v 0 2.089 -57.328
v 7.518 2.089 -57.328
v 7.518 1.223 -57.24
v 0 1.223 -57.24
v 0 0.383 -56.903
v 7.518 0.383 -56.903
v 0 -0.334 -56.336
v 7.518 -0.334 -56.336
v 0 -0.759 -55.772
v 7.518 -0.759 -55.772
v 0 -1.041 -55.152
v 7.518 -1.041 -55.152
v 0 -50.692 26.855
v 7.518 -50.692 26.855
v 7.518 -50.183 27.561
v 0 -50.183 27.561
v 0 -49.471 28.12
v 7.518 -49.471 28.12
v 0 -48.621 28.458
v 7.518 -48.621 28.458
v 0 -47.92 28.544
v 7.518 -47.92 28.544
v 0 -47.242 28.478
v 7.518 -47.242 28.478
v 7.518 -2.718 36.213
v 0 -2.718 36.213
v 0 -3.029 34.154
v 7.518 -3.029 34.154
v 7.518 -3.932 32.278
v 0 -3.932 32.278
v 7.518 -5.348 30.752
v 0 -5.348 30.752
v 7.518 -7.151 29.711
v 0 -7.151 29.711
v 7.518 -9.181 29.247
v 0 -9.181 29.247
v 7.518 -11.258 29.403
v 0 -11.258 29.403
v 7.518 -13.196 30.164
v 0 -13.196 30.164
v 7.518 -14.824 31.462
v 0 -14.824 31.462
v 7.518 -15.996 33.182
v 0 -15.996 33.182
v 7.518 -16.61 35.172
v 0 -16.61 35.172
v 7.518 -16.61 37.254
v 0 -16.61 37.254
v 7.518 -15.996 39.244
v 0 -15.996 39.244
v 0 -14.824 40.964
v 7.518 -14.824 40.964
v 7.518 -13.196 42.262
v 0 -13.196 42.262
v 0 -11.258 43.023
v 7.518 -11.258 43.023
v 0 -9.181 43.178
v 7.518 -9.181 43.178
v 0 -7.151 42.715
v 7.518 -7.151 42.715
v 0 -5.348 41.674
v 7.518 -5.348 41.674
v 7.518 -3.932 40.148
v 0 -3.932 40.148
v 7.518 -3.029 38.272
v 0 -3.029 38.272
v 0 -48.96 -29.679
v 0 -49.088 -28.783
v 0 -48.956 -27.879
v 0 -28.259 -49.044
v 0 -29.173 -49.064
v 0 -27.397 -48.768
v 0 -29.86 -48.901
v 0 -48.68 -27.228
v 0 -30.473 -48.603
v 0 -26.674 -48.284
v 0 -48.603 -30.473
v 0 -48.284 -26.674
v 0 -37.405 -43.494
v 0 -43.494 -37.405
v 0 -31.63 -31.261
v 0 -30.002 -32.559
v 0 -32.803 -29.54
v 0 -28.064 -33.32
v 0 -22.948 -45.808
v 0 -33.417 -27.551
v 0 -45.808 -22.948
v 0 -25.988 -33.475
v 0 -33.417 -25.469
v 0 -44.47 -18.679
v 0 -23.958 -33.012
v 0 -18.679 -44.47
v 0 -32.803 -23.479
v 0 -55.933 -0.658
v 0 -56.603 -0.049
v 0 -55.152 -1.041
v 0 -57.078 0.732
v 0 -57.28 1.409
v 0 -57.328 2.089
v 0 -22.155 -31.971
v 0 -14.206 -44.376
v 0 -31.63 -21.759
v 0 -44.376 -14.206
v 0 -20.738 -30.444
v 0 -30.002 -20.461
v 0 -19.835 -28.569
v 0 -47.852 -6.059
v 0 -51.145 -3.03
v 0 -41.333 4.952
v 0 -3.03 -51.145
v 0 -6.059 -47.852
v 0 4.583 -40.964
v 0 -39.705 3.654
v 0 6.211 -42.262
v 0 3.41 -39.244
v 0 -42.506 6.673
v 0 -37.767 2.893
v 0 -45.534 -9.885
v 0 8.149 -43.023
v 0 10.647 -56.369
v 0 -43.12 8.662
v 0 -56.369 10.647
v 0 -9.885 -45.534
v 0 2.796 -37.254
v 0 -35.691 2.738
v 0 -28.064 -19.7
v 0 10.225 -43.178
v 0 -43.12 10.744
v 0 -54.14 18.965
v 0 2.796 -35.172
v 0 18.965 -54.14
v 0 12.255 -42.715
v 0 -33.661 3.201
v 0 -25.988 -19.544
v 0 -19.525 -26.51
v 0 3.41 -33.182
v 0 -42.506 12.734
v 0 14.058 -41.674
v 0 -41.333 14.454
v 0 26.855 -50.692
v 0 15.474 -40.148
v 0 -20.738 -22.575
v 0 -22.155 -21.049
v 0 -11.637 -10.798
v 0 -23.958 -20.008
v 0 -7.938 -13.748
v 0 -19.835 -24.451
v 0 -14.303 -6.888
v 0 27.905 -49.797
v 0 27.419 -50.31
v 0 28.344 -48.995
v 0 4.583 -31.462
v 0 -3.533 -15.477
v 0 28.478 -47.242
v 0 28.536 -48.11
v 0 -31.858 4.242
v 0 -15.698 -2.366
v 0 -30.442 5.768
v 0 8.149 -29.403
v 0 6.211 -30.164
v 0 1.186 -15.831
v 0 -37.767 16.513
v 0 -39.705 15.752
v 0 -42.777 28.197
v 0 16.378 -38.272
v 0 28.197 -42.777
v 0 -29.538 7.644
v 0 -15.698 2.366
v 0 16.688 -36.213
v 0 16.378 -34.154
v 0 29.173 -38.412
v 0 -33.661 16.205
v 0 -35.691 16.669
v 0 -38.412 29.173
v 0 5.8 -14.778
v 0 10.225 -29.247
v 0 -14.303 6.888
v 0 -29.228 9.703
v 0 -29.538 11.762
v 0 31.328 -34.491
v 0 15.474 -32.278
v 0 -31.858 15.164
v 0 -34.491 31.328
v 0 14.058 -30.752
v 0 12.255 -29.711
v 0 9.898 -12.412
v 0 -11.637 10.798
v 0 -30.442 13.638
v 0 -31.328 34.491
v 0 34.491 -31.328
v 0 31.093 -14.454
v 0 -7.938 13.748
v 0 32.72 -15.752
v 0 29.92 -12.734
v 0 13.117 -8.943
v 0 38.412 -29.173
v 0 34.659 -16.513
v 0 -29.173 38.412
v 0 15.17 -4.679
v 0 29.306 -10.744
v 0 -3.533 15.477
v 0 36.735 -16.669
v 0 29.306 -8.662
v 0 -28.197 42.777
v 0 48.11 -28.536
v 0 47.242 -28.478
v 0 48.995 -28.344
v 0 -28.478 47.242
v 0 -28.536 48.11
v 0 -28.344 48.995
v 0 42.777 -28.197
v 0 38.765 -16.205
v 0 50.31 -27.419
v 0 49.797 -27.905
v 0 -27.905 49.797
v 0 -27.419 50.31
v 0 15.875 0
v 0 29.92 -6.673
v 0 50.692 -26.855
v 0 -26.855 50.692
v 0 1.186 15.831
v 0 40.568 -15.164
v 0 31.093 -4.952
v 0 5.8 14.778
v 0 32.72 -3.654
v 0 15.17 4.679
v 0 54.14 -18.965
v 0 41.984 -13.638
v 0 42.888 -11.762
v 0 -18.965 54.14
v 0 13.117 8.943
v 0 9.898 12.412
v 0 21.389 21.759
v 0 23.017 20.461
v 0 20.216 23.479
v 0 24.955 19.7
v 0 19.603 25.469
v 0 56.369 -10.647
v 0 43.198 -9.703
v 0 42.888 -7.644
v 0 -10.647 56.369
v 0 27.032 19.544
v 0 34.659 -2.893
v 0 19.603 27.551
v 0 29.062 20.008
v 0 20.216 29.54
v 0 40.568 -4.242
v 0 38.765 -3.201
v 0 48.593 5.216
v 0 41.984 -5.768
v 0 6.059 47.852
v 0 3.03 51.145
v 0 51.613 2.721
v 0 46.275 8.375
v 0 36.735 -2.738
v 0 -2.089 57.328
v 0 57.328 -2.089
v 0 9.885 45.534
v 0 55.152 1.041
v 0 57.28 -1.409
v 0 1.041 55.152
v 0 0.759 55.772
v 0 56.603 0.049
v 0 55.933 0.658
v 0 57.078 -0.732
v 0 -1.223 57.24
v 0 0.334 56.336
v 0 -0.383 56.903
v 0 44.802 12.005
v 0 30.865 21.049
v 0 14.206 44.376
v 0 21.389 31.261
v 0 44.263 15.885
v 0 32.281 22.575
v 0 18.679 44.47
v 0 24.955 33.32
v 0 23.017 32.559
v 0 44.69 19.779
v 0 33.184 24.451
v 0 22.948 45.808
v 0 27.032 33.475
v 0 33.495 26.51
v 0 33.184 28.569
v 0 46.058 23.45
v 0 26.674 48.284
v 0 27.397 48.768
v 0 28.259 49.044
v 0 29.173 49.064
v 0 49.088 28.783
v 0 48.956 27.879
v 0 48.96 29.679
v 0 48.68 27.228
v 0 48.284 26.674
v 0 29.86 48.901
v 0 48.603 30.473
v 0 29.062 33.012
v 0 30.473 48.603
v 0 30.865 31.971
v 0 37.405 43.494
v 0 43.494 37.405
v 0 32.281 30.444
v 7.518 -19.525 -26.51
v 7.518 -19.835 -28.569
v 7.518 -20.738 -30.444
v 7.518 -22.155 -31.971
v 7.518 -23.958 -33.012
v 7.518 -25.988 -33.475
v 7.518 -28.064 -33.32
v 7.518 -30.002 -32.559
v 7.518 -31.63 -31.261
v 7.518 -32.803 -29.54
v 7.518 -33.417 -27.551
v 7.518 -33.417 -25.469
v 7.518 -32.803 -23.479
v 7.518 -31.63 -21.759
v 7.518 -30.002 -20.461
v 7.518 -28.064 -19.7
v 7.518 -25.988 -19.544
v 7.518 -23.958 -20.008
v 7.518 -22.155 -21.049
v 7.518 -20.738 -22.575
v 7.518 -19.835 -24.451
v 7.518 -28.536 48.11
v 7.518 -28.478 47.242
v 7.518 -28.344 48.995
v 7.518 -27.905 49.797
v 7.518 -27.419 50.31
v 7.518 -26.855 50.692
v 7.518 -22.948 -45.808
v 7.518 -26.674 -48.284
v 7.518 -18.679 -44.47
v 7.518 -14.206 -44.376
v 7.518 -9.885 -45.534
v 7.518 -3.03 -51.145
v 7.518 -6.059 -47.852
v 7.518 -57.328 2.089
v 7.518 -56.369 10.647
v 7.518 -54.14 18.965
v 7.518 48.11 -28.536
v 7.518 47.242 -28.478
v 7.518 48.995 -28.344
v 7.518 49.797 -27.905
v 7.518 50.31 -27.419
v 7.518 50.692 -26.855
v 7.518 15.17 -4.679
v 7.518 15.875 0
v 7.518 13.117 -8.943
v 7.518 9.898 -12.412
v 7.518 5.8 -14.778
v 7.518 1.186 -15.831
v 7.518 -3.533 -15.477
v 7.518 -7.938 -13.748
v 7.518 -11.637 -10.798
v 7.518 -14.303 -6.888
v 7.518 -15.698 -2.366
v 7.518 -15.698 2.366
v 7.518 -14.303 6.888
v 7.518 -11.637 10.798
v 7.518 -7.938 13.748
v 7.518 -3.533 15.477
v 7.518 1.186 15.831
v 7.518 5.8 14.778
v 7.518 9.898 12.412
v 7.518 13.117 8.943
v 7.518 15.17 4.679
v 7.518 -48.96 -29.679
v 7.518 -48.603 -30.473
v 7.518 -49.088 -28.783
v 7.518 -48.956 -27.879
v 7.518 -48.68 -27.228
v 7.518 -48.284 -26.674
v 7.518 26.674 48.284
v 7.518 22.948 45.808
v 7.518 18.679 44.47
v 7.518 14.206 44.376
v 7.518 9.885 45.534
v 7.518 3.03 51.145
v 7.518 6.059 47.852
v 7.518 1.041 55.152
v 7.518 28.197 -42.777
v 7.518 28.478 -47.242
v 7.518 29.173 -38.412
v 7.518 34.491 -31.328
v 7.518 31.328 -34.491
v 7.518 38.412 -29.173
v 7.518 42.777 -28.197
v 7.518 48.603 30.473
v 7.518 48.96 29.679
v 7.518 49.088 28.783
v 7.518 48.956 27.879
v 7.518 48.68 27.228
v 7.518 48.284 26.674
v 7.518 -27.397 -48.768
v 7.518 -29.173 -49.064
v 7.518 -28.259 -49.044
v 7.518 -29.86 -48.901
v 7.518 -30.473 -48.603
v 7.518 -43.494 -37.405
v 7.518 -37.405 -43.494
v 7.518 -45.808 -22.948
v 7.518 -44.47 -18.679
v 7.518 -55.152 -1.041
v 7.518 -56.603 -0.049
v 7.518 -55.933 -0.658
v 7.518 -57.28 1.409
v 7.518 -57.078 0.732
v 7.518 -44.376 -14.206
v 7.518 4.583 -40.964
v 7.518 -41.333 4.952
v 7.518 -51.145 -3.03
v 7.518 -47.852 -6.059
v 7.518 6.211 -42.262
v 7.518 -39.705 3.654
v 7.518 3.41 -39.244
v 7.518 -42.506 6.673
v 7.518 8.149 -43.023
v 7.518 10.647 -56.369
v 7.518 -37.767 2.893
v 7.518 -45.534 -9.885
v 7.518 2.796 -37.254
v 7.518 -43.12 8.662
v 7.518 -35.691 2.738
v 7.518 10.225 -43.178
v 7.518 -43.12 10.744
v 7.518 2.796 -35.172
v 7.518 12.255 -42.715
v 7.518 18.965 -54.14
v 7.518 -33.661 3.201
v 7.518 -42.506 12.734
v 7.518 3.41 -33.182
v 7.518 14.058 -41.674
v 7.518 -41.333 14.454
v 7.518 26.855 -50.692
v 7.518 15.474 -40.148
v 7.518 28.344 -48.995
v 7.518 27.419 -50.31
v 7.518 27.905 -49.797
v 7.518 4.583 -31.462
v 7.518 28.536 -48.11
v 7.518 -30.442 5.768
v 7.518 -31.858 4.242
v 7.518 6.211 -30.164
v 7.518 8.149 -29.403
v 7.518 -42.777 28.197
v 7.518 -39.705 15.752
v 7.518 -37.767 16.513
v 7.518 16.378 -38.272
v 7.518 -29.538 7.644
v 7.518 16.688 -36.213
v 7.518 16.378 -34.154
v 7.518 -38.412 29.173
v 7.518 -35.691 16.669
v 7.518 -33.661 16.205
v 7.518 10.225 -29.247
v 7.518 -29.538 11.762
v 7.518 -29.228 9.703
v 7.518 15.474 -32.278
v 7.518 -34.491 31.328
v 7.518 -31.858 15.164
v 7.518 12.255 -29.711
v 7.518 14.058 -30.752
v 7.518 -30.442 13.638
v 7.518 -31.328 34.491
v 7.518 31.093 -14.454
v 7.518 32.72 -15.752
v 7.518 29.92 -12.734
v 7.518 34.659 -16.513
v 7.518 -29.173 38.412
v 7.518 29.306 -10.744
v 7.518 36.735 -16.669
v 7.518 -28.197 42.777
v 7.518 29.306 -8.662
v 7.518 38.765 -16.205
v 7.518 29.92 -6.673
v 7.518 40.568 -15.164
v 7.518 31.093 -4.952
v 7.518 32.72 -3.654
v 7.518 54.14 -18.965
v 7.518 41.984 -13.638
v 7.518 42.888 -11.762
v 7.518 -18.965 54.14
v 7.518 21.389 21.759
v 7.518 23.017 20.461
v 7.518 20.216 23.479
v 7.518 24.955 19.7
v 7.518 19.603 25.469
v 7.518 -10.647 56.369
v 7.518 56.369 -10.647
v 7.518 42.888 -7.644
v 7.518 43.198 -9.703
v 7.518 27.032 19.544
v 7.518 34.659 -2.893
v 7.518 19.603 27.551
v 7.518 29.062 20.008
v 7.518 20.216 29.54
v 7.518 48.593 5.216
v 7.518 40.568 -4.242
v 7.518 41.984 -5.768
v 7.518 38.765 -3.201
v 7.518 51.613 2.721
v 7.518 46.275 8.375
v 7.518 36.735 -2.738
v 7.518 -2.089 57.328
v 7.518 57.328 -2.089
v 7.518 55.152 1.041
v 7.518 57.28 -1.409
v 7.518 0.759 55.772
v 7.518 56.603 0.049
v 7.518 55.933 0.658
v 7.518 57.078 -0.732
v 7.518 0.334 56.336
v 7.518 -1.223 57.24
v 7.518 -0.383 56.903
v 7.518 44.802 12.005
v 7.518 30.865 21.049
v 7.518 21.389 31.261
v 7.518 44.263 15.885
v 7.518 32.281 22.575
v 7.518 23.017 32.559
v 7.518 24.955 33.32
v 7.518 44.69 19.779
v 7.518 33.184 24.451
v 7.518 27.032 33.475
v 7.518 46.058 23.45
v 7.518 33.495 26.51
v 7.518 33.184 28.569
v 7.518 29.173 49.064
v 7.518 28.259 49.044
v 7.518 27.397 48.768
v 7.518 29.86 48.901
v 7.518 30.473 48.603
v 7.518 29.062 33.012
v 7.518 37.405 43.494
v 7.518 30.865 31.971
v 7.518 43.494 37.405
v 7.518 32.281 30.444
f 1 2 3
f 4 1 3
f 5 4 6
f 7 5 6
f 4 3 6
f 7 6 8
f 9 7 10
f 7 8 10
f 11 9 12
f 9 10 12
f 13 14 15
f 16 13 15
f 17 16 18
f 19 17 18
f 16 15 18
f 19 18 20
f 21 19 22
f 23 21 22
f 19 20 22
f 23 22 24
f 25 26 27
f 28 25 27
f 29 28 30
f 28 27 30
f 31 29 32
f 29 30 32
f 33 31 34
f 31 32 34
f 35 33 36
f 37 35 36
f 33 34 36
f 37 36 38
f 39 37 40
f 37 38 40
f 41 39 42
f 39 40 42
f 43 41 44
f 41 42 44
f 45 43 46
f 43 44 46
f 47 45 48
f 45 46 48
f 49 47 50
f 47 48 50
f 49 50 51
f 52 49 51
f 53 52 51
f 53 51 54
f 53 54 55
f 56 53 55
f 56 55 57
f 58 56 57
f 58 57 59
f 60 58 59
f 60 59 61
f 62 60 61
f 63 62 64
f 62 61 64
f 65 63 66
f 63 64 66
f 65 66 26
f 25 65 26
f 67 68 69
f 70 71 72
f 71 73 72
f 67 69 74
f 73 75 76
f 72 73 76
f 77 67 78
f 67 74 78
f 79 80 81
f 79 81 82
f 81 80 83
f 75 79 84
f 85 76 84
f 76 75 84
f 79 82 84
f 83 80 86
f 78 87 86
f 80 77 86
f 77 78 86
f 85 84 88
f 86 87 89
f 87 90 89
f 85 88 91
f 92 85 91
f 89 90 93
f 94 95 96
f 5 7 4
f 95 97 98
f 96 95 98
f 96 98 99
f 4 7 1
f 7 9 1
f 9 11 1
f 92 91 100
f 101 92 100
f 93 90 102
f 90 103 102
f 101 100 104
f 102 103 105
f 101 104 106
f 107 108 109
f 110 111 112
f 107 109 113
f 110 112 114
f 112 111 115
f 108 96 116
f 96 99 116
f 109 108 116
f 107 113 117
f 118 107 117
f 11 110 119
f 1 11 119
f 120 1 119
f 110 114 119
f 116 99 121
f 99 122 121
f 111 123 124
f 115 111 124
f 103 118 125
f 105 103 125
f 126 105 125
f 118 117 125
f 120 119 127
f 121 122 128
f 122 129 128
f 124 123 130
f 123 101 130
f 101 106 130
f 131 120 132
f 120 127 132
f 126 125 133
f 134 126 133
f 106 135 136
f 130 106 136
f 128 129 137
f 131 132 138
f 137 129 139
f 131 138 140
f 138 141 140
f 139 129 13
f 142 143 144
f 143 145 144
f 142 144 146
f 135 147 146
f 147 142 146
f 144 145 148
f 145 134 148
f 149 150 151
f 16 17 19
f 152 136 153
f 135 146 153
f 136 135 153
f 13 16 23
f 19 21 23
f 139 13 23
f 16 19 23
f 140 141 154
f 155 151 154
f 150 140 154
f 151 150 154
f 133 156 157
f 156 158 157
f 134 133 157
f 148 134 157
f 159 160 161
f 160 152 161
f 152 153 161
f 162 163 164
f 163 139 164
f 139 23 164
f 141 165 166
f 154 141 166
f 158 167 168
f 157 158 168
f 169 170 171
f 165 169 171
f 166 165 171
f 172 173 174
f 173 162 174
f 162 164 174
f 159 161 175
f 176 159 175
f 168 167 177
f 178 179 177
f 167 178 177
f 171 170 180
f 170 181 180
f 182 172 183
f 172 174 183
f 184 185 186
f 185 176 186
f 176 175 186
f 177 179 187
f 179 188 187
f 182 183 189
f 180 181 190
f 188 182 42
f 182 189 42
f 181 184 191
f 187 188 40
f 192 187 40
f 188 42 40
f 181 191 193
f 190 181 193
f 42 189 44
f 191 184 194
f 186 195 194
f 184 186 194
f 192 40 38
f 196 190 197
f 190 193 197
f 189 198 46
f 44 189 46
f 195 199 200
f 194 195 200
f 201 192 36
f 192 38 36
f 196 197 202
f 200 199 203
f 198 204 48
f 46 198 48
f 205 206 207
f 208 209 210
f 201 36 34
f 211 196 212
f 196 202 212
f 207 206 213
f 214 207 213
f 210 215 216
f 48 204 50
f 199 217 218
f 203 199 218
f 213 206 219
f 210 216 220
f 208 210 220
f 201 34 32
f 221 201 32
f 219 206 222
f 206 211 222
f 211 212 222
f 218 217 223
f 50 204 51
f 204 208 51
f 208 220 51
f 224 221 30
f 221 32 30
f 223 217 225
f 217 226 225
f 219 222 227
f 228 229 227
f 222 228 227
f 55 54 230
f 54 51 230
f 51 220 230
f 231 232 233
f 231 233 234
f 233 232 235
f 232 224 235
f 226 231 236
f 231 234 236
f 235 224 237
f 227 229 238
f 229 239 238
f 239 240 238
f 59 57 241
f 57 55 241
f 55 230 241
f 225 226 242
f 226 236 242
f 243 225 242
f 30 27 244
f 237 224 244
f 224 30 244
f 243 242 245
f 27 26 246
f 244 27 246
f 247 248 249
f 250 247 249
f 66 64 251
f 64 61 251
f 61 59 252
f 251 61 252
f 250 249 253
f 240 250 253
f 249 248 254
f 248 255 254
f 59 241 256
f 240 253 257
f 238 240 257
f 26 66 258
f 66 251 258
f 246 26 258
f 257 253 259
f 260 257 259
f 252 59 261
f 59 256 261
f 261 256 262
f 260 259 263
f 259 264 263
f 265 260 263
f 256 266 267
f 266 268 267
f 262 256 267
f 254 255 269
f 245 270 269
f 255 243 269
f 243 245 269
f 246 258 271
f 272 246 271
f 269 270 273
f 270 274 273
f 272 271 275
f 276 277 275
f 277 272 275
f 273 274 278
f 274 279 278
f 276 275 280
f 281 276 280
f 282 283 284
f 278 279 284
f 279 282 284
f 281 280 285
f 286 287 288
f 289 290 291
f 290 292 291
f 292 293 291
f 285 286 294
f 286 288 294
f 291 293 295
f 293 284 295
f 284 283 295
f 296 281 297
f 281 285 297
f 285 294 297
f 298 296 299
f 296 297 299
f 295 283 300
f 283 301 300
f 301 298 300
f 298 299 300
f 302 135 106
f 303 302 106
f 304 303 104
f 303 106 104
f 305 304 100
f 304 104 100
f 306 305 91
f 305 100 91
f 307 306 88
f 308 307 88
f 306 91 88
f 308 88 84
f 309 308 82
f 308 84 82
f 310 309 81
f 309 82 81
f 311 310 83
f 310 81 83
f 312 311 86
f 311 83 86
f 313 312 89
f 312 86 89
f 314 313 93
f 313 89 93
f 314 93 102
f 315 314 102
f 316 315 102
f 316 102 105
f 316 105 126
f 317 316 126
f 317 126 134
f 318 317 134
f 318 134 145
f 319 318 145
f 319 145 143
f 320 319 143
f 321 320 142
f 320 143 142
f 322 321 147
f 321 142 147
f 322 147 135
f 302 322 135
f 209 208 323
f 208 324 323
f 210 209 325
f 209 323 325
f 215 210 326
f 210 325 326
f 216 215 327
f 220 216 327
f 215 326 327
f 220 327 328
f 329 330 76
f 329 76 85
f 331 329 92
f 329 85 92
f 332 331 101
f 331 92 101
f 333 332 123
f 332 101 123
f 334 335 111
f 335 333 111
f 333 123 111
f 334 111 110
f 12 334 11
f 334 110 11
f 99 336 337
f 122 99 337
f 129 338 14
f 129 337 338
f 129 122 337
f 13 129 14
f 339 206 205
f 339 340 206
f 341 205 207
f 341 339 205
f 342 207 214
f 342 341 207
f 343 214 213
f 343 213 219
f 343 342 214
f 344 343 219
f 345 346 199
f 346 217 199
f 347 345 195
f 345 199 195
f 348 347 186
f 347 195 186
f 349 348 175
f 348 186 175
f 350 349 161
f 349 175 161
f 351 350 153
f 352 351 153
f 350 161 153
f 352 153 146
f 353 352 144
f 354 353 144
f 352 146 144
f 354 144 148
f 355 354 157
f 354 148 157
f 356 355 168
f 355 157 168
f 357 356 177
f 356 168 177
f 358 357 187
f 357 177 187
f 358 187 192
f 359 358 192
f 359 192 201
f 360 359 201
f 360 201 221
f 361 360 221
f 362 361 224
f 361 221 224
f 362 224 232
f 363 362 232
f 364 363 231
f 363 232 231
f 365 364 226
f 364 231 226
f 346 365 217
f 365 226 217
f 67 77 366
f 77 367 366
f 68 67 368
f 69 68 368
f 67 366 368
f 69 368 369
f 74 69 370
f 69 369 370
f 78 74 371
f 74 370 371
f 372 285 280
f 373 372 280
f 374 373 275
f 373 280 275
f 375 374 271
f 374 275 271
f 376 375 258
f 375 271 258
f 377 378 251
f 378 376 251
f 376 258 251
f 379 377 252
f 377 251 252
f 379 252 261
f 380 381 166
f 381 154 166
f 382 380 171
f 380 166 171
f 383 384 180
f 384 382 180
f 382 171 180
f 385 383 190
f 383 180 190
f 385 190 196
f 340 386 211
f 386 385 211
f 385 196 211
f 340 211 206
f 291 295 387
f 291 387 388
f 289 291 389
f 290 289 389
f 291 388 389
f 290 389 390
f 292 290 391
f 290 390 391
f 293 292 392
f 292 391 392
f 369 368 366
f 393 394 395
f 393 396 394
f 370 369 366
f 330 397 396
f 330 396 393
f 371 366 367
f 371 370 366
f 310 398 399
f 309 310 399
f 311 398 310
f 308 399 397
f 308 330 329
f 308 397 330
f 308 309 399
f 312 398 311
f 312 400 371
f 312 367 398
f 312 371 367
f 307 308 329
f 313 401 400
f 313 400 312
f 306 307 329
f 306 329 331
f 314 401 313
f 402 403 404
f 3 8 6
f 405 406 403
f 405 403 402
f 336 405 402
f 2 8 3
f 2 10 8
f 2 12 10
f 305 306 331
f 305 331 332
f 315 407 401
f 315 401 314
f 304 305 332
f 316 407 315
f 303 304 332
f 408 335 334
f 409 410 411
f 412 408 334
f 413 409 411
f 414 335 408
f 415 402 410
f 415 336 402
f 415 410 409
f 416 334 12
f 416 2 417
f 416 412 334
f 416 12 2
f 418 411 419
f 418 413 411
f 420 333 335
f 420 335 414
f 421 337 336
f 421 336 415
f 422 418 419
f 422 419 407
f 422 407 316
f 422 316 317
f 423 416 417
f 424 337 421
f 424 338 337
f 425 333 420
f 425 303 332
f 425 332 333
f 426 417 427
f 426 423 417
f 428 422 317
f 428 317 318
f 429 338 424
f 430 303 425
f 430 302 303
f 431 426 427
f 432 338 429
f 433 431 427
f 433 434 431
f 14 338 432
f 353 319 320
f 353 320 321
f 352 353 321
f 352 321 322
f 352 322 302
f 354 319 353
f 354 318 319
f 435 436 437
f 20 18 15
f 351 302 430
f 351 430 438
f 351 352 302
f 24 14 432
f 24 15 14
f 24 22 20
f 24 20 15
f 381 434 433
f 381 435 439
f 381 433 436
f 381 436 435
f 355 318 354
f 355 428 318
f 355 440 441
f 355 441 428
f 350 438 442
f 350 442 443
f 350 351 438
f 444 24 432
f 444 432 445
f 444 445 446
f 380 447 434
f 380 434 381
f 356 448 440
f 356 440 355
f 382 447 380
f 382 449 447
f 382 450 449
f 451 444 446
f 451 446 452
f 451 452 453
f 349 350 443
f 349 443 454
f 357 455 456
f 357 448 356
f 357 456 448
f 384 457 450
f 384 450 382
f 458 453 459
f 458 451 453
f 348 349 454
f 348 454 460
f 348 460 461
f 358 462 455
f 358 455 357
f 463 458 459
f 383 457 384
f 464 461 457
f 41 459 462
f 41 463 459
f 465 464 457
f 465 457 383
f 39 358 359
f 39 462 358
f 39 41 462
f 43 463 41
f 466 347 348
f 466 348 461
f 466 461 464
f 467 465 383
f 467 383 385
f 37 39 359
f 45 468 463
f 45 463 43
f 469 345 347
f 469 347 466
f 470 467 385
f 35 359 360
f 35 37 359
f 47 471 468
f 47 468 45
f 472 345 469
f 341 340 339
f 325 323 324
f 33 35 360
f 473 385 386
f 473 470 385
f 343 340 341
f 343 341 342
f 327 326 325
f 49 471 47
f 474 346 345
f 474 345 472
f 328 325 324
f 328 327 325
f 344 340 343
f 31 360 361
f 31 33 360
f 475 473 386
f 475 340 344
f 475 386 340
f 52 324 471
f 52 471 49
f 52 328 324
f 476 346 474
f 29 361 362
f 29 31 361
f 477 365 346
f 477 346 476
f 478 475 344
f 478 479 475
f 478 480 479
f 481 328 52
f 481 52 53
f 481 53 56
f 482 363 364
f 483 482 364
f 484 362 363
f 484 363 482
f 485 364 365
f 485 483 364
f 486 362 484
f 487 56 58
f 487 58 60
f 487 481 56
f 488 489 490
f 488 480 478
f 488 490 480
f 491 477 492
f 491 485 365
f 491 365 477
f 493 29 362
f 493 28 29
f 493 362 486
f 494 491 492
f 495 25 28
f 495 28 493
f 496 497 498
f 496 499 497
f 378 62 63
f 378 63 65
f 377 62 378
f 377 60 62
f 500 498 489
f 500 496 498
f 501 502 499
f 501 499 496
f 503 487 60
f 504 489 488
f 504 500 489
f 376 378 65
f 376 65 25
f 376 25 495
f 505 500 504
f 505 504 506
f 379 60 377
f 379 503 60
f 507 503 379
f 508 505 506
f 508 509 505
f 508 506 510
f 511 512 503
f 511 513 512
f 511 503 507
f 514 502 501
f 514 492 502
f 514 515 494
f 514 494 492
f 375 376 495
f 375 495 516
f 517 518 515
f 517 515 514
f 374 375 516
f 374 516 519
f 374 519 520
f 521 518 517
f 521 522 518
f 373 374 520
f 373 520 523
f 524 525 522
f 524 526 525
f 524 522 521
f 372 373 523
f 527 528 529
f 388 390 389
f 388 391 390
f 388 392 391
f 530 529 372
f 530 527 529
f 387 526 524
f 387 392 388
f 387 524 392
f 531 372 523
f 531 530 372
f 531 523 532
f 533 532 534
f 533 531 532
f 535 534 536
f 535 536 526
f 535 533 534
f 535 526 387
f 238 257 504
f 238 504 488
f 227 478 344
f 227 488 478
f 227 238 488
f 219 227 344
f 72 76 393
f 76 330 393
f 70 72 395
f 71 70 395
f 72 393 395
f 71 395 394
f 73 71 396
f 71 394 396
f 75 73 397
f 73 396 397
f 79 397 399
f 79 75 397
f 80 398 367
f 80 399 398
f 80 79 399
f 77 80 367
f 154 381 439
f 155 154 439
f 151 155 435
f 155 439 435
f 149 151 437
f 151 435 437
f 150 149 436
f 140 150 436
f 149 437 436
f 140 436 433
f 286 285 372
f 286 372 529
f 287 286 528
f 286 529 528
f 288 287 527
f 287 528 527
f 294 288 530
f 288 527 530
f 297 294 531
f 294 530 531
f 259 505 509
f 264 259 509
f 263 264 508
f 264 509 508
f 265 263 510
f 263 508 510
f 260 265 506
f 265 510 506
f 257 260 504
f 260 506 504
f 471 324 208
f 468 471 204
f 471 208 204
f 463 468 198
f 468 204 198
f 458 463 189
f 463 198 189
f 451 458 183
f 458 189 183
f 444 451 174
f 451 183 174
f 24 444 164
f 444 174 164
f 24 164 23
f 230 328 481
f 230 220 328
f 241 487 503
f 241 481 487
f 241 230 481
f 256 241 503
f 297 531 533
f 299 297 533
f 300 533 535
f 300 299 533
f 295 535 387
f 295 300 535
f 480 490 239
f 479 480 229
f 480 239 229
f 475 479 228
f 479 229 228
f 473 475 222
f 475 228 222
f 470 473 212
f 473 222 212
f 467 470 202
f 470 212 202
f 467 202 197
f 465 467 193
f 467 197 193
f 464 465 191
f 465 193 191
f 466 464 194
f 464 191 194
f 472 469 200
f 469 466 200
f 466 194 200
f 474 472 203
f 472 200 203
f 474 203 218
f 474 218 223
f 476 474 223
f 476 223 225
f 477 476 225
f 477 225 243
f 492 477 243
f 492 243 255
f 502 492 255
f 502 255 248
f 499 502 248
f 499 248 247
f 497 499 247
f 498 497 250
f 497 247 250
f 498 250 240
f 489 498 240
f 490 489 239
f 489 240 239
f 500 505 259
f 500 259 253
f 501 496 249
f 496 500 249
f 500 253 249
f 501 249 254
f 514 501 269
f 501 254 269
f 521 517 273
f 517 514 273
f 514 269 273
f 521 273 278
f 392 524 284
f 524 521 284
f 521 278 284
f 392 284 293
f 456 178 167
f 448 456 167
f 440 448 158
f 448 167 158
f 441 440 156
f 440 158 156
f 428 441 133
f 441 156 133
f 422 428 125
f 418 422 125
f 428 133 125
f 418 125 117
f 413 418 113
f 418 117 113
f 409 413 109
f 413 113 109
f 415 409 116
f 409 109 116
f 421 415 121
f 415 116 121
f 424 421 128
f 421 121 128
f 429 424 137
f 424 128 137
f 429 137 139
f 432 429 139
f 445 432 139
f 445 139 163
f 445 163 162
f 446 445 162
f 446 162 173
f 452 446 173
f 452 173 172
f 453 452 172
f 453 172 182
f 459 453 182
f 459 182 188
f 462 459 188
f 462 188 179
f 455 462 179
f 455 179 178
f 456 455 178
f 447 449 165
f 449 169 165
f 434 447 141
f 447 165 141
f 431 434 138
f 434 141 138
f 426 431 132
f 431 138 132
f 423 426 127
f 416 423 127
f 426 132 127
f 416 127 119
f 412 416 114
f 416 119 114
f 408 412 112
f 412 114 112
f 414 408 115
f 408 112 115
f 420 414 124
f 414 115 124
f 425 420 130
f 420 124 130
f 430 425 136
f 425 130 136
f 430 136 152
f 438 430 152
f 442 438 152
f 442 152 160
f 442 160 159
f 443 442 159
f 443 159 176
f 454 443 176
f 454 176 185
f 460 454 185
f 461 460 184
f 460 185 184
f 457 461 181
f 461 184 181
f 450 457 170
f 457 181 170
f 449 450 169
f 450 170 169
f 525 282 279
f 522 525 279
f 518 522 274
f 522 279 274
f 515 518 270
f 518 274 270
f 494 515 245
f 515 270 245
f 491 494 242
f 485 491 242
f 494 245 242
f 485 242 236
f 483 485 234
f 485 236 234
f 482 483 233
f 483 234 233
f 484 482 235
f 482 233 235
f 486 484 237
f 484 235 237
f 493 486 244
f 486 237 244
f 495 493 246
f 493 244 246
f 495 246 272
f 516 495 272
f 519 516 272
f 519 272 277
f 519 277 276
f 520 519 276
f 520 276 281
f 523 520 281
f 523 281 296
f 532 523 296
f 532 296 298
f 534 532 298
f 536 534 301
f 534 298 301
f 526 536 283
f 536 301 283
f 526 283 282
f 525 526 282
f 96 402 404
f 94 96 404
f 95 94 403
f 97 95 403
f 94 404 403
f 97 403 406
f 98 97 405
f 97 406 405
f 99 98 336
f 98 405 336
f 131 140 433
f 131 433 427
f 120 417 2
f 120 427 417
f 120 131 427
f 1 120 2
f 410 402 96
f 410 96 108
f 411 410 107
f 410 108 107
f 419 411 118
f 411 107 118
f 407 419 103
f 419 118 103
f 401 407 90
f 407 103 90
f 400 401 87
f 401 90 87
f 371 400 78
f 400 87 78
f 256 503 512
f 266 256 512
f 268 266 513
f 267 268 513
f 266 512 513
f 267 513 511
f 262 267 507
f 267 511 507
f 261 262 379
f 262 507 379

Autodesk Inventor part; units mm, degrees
ref_plane "YZ Plane" through (0, 0, 0) normal (1, 0, 0) x (0, 1, 0)
ref_plane "XZ Plane" through (0, 0, 0) normal (0, 1, 0) x (-1, 0, 0)
ref_plane "XY Plane" through (0, 0, 0) normal (0, 0, 1) x (1, 0, 0)
sketch "Sketch1" plane through (0, 0, 0) normal (1, 0, 0) x (0, 1, 0)
  circle A0 centre (0, 0) radius 57.3659
  circle A1 centre (0, 0) radius 37.4904
  circle A2 centre (26.5097, 26.5097) radius 6.985
  line L0 (0, 0) -> (26.5097, 26.5097)
  line L1 (0, 0) -> (37.4904, 0) construction
  circle A3 centre (-9.7032, 36.2129) radius 6.985
  circle A4 centre (-36.2129, 9.7032) radius 6.985
  circle A5 centre (-26.5097, -26.5097) radius 6.985
  circle A6 centre (9.7032, -36.2129) radius 6.985
  circle A7 centre (36.2129, -9.7032) radius 6.985
  circle A8 centre (0, 0) radius 15.875
  circle A9 centre (60.1365, 16.1135) radius 15.875
  line L2 (0, 0) -> (62.2818, 0) construction
  line L3 (0, 0) -> (54.4204, 0) construction
  line L4 (0, 0) -> (47.0027, 0) construction
  line L5 (0, 0) -> (74.4134, 19.939)
  line L6 (0, 0) -> (77.0384, 0) construction
  circle A10 centre (0, 0) radius 15.875
  circle A11 centre (16.1135, 60.1365) radius 15.875
  circle A12 centre (0, 0) radius 15.875
  circle A13 centre (-44.023, 44.023) radius 15.875
  circle A14 centre (0, 0) radius 15.875
  circle A15 centre (-60.1365, -16.1135) radius 15.875
  circle A16 centre (0, 0) radius 15.875
  circle A17 centre (-16.1135, -60.1365) radius 15.875
  circle A18 centre (0, 0) radius 15.875
  circle A19 centre (44.023, -44.023) radius 15.875
  point P0 (36.2129, 9.7032)
  point P1 (49.9198, 28.264)
  point P2 (28.264, 49.9198)
  point P3 (0.4825, 57.3639)
  point P4 (-29.0998, 49.4373)
  point P5 (-49.4373, 29.0998)
  point P6 (-57.3639, -0.4825)
  point P7 (-49.9198, -28.264)
  point P8 (-28.264, -49.9198)
  point P9 (-0.4825, -57.3639)
  point P10 (29.0998, -49.4373)
  point P11 (49.4373, -29.0998)
  point P12 (57.3639, 0.4825)
  dimension "d0" = 114.7318
  dimension "d1" = 74.9808
  dimension "d2" = 13.97
  dimension "d3" = 45
  dimension "d6" = 360
  dimension "d8" = 31.75
  dimension "d12" = 31.75
  dimension "d16" = 15
  dimension "d19" = 360
extrude "Extrusion1" add sketch "Sketch1" along normal blind 7.5184 contours A1 A7 A6 A5 A4 A3 A2 L0 A8 L5 | L5 A8 L0 A2 A1 | A0 A19 A17 A15 A13 A11 A9
fillet "Fillet1" radius 3.175 12 edges at (3.7592, 57.3639, 0.4825) (3.7592, 49.9198, 28.264) (3.7592, 29.0998, -49.4373) (3.7592, 49.4373, -29.0998) (3.7592, -0.4825, -57.3639) (3.7592, -28.264, -49.9198) (3.7592, -49.9198, -28.264) (3.7592, -57.3639, -0.4825) (3.7592, -49.4373, 29.0998) (3.7592, -29.0998, 49.4373) (3.7592, 0.4825, 57.3639) (3.7592, 28.264, 49.9198)
properties part number "Flex_Giubo_V1"
